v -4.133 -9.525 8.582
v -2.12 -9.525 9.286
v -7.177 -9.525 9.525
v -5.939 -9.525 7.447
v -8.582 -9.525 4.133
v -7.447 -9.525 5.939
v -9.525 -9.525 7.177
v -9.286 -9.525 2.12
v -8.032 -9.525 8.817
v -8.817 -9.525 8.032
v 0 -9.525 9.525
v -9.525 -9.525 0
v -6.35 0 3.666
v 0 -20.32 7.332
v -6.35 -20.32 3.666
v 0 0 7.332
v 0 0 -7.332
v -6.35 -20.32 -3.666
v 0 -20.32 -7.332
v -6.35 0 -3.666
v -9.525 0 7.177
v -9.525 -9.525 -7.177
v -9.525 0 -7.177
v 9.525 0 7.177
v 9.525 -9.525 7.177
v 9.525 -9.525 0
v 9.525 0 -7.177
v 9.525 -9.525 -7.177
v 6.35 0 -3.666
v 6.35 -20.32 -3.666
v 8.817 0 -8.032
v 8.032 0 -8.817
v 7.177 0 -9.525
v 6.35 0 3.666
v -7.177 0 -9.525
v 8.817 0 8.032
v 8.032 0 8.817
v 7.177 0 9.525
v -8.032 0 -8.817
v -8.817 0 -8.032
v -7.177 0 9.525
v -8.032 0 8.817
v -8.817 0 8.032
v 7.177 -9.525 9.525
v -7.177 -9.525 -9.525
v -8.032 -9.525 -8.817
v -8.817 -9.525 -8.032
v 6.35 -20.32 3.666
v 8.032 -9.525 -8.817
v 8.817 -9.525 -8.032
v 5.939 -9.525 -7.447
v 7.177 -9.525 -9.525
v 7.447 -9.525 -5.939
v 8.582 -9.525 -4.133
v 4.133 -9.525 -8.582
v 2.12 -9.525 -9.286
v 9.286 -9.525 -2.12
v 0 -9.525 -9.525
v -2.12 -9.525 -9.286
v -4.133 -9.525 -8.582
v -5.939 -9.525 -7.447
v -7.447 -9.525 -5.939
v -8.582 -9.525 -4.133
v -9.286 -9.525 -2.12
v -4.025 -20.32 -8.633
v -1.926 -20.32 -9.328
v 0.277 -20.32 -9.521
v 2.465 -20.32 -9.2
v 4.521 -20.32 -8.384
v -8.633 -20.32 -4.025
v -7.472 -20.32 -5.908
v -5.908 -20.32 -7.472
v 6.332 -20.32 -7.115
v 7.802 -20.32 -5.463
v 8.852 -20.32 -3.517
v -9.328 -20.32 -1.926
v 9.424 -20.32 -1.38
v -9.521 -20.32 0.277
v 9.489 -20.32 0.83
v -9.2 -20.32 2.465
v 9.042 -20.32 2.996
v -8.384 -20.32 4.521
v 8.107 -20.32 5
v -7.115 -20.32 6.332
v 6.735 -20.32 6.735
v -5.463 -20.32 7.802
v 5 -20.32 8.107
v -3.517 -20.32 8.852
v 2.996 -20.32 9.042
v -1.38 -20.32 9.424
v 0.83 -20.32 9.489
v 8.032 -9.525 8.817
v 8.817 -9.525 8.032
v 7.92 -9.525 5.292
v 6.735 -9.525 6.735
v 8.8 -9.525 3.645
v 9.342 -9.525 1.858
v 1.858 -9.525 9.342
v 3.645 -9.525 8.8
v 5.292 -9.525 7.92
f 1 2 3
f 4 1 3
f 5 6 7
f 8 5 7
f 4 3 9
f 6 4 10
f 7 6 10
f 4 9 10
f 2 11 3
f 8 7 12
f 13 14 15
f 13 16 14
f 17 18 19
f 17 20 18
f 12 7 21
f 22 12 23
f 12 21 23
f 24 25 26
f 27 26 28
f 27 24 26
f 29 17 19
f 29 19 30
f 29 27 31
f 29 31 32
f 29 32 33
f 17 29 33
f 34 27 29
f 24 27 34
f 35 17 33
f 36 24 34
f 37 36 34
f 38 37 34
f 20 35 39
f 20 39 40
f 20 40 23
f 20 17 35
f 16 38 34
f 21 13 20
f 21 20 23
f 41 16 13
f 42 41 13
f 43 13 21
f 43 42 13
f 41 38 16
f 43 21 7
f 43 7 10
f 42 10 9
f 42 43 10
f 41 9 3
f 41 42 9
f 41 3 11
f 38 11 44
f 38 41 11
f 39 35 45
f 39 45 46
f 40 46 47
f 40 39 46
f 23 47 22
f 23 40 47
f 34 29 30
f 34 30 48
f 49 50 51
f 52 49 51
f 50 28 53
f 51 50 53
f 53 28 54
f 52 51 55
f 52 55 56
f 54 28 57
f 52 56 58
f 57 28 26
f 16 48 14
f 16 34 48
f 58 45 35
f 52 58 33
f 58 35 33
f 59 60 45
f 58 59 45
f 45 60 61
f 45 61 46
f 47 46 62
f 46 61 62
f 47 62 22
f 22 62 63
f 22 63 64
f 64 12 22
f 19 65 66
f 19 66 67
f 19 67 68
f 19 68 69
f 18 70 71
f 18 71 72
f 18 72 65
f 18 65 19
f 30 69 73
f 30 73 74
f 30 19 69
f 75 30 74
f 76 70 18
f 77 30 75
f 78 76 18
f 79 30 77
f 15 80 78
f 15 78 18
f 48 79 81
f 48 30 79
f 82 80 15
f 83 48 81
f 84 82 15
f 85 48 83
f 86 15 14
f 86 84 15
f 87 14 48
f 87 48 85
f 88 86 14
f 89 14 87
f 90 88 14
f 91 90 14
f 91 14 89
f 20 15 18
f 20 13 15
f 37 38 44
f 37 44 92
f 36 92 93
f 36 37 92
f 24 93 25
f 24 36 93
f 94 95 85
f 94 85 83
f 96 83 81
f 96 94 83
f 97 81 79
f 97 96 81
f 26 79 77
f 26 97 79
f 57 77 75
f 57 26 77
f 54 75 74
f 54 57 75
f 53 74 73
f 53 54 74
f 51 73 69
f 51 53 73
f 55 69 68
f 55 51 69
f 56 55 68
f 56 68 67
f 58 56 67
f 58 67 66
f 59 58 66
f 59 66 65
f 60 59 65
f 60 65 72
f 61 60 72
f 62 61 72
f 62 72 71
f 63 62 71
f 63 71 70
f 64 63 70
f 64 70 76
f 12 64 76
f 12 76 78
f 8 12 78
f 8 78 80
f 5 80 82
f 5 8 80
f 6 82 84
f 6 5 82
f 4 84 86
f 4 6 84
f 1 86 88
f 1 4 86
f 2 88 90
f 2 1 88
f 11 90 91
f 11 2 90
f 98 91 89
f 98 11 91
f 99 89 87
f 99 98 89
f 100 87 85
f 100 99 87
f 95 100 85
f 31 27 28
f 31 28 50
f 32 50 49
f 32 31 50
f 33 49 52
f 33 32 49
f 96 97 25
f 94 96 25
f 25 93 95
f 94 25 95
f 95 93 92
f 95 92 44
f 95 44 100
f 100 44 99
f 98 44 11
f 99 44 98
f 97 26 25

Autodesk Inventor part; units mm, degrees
ref_plane "YZ Plane" through (0, 0, 0) normal (1, 0, 0) x (0, 1, 0)
ref_plane "XZ Plane" through (0, 0, 0) normal (0, 1, 0) x (-1, 0, 0)
ref_plane "XY Plane" through (0, 0, 0) normal (0, 0, 1) x (1, 0, 0)
sketch "Sketch1" plane through (0, 0, 0) normal (0, 1, 0) x (-1, 0, 0)
  line L0 (6.35, -3.6662) -> (0, -7.3323)
  line L1 (0, -7.3323) -> (-6.35, -3.6662)
  line L2 (-6.35, -3.6662) -> (-6.35, 3.6662)
  line L3 (-6.35, 3.6662) -> (0, 7.3323)
  line L4 (0, 7.3323) -> (6.35, 3.6662)
  line L5 (6.35, 3.6662) -> (6.35, -3.6662)
  line L6 (9.525, 7.1772) -> (9.525, -7.1772)
  line L7 (-9.525, 7.1772) -> (-9.525, -7.1772)
  line L8 (7.1772, 9.525) -> (-7.1772, 9.525)
  line L9 (7.1772, -9.525) -> (-7.1772, -9.525)
  arc A0 (7.1772, -9.525) -> (9.525, -7.1772) centre (0, 0) ccw
  arc A1 (9.525, 7.1772) -> (7.1772, 9.525) centre (0, 0) ccw
  arc A2 (-7.1772, 9.525) -> (-9.525, 7.1772) centre (0, 0) ccw
  arc A3 (-9.525, -7.1772) -> (-7.1772, -9.525) centre (0, 0) ccw
  dimension "d0" = 12.7
  dimension "d9" = 9.525
  dimension "d10" = 9.525
  dimension "d11" = 9.525
  dimension "d12" = 9.525
extrude "Extrusion1" add sketch "Sketch1" against normal blind 9.525 contours L0 L1 L2 L3 L4 L5 | L6 A0 L9 A3 L7 A2 L8 A1
sketch "Sketch2" plane through (0, -9.525, 0) normal (0, -1, 0) x (0.7071, 0, 0.7071)
  circle A0 centre (0, 0) radius 9.525
  dimension "d4" = 19.05
extrude "Extrusion2" add sketch "Sketch2" along normal blind 10.795
extrude "Extrusion3" cut sketch "Sketch1" against normal through all contours L0 L1 L2 L3 L4 L5
equation "\"d10\" = d9"
equation "\"d11\" = d9"
equation "\"d12\" = d11"
properties part number "T81H-RS81" material "Aluminum 6061"
